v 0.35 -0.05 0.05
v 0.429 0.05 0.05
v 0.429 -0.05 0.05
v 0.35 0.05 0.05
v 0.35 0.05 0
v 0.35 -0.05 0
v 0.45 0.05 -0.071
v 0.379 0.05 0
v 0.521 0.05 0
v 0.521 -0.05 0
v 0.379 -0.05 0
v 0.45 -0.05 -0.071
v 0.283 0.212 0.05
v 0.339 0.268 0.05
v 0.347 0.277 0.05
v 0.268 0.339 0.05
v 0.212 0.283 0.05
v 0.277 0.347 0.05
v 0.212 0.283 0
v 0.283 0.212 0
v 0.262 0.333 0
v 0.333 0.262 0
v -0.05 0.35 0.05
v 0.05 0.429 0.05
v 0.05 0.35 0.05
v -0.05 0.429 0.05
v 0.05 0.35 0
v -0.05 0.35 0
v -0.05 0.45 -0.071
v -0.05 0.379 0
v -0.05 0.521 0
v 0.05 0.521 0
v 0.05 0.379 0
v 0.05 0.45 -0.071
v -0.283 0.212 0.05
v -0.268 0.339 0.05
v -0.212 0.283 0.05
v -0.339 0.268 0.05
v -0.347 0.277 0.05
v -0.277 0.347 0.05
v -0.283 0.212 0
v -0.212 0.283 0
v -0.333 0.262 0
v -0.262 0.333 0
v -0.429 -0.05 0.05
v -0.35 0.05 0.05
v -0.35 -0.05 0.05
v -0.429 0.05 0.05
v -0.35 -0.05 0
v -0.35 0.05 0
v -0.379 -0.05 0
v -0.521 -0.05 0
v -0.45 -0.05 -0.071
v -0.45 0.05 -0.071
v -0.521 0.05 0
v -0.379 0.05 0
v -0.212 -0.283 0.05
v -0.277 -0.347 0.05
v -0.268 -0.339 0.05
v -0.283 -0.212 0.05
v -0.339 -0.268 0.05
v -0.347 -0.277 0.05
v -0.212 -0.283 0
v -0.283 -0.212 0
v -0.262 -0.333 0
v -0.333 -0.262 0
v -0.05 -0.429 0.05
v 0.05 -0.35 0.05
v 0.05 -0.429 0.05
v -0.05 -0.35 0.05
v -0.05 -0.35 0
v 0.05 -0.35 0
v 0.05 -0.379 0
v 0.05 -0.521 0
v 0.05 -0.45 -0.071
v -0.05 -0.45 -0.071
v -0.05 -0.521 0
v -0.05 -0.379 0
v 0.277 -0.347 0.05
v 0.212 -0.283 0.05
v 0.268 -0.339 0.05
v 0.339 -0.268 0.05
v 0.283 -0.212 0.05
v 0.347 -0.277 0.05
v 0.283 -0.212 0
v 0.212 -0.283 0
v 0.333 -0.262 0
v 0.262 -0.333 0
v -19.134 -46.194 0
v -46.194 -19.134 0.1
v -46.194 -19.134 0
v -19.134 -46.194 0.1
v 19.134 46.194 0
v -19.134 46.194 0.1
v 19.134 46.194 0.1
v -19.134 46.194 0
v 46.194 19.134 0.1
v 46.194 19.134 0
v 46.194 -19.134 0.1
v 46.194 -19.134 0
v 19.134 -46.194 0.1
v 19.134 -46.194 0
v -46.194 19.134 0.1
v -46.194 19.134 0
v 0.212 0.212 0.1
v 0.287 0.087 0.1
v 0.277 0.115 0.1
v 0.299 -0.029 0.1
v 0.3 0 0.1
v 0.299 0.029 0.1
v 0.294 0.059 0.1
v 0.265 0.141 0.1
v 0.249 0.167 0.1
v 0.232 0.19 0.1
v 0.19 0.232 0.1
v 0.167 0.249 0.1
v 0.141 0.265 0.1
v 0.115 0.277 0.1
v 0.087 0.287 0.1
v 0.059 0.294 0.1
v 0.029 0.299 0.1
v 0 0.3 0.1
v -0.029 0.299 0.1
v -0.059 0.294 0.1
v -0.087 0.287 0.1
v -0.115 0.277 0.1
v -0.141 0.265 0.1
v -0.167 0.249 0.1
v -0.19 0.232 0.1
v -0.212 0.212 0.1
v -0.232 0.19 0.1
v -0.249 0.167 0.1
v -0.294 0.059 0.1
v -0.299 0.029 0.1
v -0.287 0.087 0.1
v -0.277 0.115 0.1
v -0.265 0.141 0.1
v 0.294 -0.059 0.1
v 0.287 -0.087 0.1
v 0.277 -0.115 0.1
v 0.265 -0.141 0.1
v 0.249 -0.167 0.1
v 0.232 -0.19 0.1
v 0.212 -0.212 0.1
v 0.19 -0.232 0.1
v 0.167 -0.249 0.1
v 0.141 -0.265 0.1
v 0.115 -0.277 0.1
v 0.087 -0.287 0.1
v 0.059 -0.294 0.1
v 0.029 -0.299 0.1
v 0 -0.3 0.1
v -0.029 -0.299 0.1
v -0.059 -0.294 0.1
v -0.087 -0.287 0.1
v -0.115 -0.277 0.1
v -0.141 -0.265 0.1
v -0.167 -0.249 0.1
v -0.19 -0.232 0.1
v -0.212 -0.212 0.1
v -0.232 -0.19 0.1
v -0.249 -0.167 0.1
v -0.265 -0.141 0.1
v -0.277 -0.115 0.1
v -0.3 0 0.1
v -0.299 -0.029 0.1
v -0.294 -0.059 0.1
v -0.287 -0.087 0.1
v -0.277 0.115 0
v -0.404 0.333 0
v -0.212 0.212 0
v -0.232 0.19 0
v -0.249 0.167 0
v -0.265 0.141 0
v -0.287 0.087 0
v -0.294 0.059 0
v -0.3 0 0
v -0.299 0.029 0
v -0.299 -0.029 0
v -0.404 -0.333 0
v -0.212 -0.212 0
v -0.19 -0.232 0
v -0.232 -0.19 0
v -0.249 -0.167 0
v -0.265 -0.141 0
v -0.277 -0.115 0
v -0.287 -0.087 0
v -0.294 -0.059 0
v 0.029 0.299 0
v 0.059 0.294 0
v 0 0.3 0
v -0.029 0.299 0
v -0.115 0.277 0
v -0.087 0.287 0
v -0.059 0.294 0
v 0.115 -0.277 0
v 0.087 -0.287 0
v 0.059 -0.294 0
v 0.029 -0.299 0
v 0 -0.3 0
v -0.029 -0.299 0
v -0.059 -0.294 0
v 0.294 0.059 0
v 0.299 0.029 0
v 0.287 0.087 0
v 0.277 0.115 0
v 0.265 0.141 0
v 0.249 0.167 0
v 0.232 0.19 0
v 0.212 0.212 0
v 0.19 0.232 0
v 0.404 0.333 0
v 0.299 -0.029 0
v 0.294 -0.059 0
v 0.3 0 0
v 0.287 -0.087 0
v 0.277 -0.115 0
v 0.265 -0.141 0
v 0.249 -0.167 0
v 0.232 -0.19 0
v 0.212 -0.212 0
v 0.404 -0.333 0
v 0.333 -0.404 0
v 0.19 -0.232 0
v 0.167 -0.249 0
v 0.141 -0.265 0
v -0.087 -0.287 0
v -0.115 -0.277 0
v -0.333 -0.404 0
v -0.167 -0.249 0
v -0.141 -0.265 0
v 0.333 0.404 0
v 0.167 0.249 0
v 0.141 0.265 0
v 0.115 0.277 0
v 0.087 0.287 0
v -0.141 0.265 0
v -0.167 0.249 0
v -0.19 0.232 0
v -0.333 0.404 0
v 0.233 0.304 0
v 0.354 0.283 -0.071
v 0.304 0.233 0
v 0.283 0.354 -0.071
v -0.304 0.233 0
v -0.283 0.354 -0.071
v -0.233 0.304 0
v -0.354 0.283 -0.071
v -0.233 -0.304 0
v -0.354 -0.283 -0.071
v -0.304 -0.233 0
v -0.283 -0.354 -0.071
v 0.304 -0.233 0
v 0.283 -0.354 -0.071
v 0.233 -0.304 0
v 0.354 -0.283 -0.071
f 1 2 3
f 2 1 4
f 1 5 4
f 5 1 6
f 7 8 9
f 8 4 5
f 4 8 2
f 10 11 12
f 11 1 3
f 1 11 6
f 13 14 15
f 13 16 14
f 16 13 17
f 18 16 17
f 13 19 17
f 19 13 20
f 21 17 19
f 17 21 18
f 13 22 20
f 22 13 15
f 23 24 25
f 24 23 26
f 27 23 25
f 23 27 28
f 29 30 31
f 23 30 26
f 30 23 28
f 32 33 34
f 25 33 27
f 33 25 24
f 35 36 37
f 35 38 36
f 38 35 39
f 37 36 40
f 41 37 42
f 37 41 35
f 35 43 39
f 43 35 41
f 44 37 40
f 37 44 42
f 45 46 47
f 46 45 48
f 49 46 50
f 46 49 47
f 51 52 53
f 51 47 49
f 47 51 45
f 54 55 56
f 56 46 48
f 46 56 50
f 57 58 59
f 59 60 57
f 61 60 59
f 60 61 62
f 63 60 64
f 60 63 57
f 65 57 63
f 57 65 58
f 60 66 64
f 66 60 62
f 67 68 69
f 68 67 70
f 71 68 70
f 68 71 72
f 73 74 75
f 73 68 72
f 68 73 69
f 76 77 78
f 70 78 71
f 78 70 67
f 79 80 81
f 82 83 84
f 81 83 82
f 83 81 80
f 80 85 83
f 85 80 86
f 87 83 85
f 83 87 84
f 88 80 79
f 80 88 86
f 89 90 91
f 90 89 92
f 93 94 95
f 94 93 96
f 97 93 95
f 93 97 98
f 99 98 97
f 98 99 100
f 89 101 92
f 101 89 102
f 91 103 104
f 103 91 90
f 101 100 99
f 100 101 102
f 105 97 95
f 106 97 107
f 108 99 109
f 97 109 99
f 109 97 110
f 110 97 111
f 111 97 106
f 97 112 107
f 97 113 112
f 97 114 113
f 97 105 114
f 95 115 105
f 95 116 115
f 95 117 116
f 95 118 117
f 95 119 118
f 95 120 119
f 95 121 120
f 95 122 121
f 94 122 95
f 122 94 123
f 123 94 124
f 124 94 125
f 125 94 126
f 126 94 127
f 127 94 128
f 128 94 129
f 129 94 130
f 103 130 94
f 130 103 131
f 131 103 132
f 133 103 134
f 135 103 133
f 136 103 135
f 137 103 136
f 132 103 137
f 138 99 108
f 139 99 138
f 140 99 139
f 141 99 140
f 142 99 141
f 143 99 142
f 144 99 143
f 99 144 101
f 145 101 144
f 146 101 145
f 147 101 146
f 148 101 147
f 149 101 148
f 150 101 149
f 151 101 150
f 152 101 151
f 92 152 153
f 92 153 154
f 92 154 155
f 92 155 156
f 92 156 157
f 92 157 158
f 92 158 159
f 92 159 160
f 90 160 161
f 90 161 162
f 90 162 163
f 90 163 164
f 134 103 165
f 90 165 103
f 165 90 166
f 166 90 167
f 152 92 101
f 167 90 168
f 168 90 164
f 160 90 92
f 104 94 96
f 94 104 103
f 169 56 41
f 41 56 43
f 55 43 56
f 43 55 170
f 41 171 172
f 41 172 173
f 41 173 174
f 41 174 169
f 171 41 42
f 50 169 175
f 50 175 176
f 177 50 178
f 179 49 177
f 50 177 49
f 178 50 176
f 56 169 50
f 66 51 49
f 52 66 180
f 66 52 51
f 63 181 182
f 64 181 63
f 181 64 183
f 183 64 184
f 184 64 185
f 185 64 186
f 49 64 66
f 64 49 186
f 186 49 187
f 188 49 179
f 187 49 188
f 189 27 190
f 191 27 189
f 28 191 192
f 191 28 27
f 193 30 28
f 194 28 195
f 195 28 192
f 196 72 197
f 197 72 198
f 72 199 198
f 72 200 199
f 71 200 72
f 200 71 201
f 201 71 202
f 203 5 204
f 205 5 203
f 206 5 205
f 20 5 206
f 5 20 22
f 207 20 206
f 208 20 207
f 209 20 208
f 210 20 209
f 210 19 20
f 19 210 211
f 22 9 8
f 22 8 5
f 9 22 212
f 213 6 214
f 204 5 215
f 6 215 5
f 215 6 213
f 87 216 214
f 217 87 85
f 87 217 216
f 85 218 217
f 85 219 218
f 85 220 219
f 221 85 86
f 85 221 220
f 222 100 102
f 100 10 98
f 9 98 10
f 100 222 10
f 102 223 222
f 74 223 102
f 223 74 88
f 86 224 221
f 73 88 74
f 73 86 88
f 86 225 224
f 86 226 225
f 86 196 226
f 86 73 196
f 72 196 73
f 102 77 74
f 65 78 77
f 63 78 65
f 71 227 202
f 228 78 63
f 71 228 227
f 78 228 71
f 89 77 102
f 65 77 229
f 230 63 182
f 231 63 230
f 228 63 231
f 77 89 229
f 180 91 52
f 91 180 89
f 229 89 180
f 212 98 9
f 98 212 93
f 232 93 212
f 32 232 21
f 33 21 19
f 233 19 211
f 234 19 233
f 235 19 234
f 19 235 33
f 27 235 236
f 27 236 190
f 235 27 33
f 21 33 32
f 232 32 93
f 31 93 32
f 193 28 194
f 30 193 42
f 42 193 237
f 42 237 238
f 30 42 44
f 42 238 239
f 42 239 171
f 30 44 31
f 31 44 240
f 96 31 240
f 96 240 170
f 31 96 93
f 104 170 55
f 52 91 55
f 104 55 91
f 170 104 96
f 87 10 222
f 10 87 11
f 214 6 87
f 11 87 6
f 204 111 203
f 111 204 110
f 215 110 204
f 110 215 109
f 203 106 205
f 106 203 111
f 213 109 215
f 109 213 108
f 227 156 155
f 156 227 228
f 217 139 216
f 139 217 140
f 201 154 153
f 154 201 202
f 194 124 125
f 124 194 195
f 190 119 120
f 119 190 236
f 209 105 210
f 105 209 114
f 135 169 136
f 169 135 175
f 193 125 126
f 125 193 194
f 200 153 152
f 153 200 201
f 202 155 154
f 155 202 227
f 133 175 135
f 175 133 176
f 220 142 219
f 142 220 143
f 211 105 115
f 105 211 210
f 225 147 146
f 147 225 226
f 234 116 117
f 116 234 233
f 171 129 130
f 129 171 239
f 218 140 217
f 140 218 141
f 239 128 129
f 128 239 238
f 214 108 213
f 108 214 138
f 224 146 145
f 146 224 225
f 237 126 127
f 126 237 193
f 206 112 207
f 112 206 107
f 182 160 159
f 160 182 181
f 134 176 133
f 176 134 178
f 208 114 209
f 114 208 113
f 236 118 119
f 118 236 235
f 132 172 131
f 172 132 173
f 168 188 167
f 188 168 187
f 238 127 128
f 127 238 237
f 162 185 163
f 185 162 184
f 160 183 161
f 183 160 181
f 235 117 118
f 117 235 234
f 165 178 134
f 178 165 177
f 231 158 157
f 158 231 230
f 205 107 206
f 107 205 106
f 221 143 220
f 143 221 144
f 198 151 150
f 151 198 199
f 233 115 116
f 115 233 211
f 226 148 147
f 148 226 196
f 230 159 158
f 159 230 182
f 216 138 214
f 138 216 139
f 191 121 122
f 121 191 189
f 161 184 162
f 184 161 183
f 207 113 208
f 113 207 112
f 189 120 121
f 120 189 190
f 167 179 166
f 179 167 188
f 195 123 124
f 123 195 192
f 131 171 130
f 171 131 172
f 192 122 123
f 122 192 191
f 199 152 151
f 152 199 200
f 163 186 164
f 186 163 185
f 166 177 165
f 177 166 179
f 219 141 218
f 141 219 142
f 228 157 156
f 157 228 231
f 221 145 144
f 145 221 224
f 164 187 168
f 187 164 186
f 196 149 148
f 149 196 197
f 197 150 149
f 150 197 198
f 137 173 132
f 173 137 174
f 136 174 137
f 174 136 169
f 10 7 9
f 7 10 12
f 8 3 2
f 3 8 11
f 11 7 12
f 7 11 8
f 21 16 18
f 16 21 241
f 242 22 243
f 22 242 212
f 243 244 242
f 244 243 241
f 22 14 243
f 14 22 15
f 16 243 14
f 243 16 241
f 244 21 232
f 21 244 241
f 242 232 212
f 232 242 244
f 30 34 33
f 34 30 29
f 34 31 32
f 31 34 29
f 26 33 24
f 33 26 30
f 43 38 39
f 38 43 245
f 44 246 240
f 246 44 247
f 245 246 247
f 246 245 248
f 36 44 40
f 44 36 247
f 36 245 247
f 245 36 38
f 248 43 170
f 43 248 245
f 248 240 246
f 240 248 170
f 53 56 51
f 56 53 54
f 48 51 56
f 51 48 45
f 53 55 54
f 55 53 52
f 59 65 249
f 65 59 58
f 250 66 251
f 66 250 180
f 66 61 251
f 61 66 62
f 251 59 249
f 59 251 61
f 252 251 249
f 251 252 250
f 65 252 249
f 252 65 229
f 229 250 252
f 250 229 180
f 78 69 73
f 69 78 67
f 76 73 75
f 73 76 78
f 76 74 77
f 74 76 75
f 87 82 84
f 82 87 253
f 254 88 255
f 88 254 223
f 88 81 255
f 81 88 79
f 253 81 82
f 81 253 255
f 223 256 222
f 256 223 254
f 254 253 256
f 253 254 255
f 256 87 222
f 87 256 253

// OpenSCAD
module octagonal_ring() {
    difference() {
        // Outer octagonal profile
        scale([50, 50, 1])
        rotate([0, 0, 22.5])
        cylinder(r=1, h=0.1, $fn=8);
        
        // Inner circular opening
        translate([0, 0, -0.05])
        cylinder(r=0.3, h=0.2, $fn=64);
        
        // Square through-holes
        for (i = [0:7]) {
            rotate([0, 0, i * 45])
            translate([0.4, 0, -0.05])
            cube([0.1, 0.1, 0.2], center=true);
        }
    }
}

module chamfered_ring() {
    union() {
        // Main ring
        octagonal_ring();
        
        // Chamfered edges
        for (i = [0:7]) {
            rotate([0, 0, i * 45])
            translate([0.45, 0, 0])
            rotate([0, 45, 0])
            cube([0.1, 0.1, 0.1], center=true);
        }
    }
}

chamfered_ring();
